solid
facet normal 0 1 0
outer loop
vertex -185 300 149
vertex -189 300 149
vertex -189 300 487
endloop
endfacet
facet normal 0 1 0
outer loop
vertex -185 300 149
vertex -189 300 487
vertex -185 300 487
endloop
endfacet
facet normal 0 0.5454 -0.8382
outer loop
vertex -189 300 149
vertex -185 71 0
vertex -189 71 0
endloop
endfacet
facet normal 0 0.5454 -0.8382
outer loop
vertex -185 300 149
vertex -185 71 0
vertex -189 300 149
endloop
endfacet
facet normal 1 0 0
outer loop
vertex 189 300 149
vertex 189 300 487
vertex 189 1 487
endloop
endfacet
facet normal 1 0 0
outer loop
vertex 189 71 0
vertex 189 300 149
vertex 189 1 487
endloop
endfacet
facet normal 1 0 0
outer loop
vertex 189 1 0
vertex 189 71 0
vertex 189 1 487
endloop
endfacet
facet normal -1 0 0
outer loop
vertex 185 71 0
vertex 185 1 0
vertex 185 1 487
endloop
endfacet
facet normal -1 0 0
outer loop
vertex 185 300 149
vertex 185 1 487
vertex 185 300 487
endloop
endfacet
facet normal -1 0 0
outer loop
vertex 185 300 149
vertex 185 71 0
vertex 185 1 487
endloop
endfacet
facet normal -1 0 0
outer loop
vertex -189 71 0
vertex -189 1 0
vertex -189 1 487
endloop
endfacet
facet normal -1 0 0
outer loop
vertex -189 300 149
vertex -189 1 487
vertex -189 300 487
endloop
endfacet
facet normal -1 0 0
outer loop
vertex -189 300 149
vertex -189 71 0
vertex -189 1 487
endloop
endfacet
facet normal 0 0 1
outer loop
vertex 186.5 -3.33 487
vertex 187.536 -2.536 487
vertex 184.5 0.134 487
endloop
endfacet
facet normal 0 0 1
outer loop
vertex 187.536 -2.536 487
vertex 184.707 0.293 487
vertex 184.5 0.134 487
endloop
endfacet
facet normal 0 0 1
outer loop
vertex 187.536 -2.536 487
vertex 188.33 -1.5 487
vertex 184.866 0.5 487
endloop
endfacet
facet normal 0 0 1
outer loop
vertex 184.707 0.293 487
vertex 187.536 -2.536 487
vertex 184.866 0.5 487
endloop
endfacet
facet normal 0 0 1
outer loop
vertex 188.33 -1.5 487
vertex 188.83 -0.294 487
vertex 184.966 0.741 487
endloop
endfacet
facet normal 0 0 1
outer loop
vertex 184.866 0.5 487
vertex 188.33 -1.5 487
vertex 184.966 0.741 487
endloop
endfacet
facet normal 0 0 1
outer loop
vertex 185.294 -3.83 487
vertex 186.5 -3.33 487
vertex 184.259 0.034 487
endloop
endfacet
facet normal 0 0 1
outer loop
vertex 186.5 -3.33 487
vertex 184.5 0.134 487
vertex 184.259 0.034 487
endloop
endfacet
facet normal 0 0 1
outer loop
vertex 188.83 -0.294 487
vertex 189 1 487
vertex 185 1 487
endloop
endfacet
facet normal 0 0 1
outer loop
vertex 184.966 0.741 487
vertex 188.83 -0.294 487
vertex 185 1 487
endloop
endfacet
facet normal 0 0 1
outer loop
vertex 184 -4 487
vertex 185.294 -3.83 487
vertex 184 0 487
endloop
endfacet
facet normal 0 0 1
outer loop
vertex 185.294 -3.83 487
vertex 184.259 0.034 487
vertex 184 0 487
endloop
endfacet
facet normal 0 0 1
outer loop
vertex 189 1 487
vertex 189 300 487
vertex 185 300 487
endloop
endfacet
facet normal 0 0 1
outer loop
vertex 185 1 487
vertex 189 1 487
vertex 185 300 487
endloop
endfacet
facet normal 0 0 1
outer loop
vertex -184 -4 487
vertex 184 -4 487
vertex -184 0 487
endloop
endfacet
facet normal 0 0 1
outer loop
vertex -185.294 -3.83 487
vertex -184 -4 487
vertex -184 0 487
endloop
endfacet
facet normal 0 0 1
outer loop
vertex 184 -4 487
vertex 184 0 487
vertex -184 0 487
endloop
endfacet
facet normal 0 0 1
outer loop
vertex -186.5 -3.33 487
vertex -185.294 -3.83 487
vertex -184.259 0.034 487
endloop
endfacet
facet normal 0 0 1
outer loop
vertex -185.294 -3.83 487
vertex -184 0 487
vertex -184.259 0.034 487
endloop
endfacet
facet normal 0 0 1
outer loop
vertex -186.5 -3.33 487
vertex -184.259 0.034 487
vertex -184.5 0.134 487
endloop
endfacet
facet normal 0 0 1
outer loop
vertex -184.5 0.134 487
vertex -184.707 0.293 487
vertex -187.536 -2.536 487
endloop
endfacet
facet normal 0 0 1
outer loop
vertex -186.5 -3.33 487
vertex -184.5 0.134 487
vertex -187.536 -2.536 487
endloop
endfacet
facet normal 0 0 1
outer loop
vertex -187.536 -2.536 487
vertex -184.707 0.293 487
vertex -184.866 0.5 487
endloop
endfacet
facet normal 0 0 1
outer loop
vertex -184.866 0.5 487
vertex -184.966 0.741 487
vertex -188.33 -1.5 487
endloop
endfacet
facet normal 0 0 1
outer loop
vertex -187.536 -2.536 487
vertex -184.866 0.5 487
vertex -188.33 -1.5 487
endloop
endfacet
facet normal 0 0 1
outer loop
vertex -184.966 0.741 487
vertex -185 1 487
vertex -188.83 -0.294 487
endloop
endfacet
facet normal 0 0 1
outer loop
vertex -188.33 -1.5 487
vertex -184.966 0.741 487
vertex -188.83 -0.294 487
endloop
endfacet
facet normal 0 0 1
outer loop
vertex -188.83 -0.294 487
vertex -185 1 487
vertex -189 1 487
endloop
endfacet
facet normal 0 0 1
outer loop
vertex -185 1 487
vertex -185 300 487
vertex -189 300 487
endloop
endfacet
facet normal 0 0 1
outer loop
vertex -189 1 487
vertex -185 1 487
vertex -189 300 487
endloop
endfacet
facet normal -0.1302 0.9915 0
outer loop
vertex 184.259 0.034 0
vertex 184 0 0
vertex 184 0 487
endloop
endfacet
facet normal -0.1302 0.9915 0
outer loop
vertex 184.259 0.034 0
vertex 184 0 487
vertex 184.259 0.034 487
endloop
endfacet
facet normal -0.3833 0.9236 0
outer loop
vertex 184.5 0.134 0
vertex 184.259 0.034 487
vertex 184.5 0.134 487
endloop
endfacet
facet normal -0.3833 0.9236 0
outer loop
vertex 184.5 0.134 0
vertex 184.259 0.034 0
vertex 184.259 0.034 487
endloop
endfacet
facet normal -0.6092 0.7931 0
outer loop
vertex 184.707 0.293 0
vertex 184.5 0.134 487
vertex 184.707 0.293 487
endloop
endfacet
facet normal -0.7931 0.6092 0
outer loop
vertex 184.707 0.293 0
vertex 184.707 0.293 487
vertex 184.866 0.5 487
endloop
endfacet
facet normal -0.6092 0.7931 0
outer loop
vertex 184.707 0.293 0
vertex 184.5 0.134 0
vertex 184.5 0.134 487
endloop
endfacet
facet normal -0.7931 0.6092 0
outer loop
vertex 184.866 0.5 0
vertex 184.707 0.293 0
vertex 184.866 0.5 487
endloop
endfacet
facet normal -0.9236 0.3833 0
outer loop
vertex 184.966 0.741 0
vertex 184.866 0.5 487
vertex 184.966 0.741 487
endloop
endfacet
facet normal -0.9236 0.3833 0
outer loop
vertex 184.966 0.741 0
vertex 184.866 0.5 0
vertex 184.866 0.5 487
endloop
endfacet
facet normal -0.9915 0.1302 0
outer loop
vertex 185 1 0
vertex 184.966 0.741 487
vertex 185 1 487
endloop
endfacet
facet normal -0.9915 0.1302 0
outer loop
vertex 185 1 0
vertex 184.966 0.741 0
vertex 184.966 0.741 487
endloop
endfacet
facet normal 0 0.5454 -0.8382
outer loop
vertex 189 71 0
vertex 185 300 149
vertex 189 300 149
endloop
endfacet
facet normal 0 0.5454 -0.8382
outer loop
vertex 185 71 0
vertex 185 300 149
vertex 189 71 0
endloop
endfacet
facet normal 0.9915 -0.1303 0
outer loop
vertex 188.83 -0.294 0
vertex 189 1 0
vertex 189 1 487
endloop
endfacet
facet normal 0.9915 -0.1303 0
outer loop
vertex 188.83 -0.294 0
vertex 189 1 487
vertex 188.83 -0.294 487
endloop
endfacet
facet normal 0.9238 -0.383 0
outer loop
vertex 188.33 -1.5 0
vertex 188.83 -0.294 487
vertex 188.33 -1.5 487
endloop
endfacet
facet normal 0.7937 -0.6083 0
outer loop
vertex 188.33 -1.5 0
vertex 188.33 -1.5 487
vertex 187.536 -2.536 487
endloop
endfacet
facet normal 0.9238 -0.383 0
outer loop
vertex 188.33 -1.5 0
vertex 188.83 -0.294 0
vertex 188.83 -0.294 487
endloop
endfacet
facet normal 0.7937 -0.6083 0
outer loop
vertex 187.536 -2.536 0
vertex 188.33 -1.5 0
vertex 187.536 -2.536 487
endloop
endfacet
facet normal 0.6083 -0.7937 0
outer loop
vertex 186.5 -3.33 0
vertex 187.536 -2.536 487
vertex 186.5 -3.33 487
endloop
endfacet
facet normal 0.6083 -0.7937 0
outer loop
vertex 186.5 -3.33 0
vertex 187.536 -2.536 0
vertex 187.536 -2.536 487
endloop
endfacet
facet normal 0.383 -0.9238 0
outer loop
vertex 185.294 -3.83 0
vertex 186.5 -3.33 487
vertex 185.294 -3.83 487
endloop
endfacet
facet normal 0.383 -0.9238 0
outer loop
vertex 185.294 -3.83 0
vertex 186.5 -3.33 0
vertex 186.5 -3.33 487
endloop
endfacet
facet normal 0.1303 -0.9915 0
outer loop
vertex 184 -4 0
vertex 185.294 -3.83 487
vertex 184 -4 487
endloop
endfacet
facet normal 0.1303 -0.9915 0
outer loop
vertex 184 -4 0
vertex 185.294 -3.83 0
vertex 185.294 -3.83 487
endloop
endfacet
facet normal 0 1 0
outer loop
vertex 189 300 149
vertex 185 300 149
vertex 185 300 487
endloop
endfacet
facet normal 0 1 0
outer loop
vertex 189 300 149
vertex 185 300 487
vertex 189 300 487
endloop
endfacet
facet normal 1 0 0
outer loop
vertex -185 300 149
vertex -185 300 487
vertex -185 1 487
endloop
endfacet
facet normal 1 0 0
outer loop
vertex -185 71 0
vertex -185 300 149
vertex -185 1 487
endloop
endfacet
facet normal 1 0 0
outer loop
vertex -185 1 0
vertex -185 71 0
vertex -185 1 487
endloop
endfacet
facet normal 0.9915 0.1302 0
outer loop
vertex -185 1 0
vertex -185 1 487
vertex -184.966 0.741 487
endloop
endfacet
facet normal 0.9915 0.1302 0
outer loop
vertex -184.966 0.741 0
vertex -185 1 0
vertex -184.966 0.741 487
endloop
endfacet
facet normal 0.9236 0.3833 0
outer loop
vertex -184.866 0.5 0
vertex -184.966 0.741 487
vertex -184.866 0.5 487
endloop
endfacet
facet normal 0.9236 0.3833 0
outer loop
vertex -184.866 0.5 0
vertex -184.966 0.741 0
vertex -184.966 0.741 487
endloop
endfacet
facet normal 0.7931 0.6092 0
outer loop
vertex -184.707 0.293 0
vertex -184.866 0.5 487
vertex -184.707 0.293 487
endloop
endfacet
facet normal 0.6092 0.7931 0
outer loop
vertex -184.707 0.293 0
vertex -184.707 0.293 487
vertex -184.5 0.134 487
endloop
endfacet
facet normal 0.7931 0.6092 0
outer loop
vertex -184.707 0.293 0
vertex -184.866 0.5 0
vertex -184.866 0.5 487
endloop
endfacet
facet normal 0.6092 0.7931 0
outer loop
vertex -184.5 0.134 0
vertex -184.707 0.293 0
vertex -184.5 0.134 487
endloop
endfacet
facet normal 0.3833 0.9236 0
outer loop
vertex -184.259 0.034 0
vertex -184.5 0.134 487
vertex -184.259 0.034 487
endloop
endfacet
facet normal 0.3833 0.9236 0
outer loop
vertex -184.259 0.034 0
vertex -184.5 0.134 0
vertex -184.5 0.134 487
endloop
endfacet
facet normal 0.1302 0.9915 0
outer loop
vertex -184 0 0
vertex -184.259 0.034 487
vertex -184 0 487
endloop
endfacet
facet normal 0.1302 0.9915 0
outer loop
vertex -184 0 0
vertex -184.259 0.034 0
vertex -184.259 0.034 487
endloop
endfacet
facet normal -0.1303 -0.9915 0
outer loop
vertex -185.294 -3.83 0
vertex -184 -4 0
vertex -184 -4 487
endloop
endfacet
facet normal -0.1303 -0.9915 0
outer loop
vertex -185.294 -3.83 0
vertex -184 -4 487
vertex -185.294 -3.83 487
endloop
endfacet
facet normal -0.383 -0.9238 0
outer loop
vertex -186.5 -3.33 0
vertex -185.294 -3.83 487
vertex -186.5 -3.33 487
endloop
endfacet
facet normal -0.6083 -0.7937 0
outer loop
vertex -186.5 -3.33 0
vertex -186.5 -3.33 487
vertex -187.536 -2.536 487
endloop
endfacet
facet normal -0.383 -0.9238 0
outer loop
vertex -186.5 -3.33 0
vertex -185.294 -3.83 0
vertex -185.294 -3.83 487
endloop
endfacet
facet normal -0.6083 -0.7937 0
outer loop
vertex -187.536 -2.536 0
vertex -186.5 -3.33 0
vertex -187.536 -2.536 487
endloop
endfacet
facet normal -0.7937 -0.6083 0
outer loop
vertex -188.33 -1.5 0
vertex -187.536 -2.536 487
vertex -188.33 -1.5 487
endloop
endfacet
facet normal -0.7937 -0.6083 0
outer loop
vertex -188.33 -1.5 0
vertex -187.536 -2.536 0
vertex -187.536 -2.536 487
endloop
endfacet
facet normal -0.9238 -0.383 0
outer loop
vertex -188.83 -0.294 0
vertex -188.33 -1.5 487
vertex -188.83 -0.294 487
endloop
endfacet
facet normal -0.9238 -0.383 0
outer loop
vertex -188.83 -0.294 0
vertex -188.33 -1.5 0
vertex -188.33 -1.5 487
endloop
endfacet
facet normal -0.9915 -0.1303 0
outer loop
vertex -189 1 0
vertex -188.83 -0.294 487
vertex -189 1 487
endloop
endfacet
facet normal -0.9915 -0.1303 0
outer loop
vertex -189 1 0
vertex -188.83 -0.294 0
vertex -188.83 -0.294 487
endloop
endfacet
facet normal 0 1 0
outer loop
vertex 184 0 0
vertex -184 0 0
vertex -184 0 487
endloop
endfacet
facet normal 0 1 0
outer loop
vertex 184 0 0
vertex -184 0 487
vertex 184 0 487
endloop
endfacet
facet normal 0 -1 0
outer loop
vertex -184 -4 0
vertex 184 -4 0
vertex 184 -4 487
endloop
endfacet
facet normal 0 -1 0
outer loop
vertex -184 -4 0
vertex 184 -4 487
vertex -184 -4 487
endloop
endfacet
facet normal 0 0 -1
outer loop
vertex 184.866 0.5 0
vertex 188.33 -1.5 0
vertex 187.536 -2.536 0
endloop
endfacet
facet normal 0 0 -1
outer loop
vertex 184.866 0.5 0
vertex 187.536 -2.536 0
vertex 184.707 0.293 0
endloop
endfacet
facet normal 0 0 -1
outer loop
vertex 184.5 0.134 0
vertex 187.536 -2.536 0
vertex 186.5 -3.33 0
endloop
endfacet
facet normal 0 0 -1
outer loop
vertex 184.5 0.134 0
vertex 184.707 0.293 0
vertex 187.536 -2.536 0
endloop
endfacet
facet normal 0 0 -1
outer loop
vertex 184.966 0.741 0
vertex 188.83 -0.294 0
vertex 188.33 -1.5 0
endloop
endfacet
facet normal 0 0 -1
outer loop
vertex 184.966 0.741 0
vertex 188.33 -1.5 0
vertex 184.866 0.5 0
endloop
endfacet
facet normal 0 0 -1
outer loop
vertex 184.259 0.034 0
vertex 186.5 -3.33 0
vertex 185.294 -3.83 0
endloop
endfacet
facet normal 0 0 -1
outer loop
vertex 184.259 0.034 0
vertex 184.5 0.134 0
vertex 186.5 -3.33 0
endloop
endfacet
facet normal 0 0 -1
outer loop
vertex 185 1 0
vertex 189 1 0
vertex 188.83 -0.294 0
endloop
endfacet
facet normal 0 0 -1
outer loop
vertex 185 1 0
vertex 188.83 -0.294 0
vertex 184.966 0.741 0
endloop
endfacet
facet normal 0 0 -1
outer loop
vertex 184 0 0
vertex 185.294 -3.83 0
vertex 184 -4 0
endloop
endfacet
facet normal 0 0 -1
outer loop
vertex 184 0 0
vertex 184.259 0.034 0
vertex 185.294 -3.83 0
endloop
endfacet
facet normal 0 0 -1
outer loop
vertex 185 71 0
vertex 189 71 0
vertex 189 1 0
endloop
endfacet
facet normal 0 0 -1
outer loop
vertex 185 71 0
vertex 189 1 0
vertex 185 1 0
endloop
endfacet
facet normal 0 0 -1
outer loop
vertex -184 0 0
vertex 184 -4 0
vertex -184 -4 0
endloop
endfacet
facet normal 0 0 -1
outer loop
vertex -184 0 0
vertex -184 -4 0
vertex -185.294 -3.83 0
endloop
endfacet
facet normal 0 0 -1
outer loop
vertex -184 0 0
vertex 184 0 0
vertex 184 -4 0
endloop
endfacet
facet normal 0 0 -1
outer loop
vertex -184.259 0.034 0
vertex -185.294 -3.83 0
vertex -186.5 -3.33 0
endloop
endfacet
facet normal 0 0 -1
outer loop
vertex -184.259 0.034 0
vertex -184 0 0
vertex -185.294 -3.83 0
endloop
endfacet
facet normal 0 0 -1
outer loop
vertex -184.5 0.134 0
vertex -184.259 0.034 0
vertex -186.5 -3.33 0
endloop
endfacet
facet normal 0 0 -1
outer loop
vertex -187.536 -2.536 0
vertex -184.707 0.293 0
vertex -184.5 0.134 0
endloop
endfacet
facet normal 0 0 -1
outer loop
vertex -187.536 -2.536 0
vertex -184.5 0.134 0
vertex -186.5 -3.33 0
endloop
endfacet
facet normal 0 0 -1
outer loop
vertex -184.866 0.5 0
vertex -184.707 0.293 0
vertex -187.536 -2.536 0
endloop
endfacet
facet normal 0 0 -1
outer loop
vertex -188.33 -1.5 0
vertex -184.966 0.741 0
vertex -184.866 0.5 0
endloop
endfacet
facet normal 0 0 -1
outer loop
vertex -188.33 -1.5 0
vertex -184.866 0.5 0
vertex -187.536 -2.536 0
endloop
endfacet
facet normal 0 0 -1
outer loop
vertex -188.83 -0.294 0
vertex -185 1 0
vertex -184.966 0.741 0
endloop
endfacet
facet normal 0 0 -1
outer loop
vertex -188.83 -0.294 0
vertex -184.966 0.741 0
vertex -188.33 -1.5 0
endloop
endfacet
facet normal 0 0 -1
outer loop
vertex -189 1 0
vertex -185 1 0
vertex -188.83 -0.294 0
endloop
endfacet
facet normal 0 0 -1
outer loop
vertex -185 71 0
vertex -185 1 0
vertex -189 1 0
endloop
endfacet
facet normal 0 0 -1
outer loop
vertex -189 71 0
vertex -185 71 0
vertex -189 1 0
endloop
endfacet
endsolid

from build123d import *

# Parameters (mm, degrees)
BASE_FLANGE1_DEPTH      = 487
CUT_EXTRUDE1_DEPTH      = 686.604113173
CUT_EXTRUDE1_DEPTH_BACK = 4
CUT_EXTRUDE2_DEPTH      = 686.604113173
CUT_EXTRUDE2_DEPTH_BACK = 4


# Sheet-metal steps are written as plain solids
with BuildPart() as part:
    # Sketch1 → Base-Flange1 (new body)
    with BuildSketch(Plane.XY):
        with BuildLine():
            Line((-185, 300), (-185, 1))
            ThreePointArc((-185, 1), (-184.707106781, 0.292893219), (-184, 0))
            Line((-184, 0), (184, 0))
            ThreePointArc((184, 0), (184.707106781, 0.292893219), (185, 1))
            Line((185, 1), (185, 300))
            Line((185, 300), (189, 300))
            Line((189, 300), (189, 1))
            ThreePointArc((189, 1), (187.535533906, -2.535533906), (184, -4))
            Line((184, -4), (-184, -4))
            ThreePointArc((-184, -4), (-187.535533906, -2.535533906), (-189, 1))
            Line((-189, 1), (-189, 300))
            Line((-189, 300), (-185, 300))
        make_face()
    extrude(amount=BASE_FLANGE1_DEPTH)

    # Sketch7 → Cut-Extrude1 (cut, two sides: drawn at the far end of the back side and taken through both)
    with BuildSketch(Plane(origin=(189, 0, 0), x_dir=(0, 0, -1), z_dir=(1, 0, 0)).offset(-CUT_EXTRUDE1_DEPTH_BACK)):
        Polygon((592.444694682, -839.53580592), (0, 71), (-149, 300), (-741.444694682, 1210.53580592), (1079.626917159, 2395.425195284), (2413.516306522, 345.353583443), align=None)
    extrude(amount=CUT_EXTRUDE1_DEPTH + CUT_EXTRUDE1_DEPTH_BACK, mode=Mode.SUBTRACT)

    # Sketch9 → Cut-Extrude2 (cut, two sides: drawn at the far end of the back side and taken through both)
    with BuildSketch(Plane.ZY.offset(189).offset(-CUT_EXTRUDE2_DEPTH_BACK)):
        Polygon((741.444694682, 1210.53580592), (149, 300), (0, 71), (-592.444694682, -839.53580592), (-2413.516306522, 345.353583443), (-1079.626917159, 2395.425195284), align=None)
    extrude(amount=CUT_EXTRUDE2_DEPTH + CUT_EXTRUDE2_DEPTH_BACK, mode=Mode.SUBTRACT)


solid = part.part
